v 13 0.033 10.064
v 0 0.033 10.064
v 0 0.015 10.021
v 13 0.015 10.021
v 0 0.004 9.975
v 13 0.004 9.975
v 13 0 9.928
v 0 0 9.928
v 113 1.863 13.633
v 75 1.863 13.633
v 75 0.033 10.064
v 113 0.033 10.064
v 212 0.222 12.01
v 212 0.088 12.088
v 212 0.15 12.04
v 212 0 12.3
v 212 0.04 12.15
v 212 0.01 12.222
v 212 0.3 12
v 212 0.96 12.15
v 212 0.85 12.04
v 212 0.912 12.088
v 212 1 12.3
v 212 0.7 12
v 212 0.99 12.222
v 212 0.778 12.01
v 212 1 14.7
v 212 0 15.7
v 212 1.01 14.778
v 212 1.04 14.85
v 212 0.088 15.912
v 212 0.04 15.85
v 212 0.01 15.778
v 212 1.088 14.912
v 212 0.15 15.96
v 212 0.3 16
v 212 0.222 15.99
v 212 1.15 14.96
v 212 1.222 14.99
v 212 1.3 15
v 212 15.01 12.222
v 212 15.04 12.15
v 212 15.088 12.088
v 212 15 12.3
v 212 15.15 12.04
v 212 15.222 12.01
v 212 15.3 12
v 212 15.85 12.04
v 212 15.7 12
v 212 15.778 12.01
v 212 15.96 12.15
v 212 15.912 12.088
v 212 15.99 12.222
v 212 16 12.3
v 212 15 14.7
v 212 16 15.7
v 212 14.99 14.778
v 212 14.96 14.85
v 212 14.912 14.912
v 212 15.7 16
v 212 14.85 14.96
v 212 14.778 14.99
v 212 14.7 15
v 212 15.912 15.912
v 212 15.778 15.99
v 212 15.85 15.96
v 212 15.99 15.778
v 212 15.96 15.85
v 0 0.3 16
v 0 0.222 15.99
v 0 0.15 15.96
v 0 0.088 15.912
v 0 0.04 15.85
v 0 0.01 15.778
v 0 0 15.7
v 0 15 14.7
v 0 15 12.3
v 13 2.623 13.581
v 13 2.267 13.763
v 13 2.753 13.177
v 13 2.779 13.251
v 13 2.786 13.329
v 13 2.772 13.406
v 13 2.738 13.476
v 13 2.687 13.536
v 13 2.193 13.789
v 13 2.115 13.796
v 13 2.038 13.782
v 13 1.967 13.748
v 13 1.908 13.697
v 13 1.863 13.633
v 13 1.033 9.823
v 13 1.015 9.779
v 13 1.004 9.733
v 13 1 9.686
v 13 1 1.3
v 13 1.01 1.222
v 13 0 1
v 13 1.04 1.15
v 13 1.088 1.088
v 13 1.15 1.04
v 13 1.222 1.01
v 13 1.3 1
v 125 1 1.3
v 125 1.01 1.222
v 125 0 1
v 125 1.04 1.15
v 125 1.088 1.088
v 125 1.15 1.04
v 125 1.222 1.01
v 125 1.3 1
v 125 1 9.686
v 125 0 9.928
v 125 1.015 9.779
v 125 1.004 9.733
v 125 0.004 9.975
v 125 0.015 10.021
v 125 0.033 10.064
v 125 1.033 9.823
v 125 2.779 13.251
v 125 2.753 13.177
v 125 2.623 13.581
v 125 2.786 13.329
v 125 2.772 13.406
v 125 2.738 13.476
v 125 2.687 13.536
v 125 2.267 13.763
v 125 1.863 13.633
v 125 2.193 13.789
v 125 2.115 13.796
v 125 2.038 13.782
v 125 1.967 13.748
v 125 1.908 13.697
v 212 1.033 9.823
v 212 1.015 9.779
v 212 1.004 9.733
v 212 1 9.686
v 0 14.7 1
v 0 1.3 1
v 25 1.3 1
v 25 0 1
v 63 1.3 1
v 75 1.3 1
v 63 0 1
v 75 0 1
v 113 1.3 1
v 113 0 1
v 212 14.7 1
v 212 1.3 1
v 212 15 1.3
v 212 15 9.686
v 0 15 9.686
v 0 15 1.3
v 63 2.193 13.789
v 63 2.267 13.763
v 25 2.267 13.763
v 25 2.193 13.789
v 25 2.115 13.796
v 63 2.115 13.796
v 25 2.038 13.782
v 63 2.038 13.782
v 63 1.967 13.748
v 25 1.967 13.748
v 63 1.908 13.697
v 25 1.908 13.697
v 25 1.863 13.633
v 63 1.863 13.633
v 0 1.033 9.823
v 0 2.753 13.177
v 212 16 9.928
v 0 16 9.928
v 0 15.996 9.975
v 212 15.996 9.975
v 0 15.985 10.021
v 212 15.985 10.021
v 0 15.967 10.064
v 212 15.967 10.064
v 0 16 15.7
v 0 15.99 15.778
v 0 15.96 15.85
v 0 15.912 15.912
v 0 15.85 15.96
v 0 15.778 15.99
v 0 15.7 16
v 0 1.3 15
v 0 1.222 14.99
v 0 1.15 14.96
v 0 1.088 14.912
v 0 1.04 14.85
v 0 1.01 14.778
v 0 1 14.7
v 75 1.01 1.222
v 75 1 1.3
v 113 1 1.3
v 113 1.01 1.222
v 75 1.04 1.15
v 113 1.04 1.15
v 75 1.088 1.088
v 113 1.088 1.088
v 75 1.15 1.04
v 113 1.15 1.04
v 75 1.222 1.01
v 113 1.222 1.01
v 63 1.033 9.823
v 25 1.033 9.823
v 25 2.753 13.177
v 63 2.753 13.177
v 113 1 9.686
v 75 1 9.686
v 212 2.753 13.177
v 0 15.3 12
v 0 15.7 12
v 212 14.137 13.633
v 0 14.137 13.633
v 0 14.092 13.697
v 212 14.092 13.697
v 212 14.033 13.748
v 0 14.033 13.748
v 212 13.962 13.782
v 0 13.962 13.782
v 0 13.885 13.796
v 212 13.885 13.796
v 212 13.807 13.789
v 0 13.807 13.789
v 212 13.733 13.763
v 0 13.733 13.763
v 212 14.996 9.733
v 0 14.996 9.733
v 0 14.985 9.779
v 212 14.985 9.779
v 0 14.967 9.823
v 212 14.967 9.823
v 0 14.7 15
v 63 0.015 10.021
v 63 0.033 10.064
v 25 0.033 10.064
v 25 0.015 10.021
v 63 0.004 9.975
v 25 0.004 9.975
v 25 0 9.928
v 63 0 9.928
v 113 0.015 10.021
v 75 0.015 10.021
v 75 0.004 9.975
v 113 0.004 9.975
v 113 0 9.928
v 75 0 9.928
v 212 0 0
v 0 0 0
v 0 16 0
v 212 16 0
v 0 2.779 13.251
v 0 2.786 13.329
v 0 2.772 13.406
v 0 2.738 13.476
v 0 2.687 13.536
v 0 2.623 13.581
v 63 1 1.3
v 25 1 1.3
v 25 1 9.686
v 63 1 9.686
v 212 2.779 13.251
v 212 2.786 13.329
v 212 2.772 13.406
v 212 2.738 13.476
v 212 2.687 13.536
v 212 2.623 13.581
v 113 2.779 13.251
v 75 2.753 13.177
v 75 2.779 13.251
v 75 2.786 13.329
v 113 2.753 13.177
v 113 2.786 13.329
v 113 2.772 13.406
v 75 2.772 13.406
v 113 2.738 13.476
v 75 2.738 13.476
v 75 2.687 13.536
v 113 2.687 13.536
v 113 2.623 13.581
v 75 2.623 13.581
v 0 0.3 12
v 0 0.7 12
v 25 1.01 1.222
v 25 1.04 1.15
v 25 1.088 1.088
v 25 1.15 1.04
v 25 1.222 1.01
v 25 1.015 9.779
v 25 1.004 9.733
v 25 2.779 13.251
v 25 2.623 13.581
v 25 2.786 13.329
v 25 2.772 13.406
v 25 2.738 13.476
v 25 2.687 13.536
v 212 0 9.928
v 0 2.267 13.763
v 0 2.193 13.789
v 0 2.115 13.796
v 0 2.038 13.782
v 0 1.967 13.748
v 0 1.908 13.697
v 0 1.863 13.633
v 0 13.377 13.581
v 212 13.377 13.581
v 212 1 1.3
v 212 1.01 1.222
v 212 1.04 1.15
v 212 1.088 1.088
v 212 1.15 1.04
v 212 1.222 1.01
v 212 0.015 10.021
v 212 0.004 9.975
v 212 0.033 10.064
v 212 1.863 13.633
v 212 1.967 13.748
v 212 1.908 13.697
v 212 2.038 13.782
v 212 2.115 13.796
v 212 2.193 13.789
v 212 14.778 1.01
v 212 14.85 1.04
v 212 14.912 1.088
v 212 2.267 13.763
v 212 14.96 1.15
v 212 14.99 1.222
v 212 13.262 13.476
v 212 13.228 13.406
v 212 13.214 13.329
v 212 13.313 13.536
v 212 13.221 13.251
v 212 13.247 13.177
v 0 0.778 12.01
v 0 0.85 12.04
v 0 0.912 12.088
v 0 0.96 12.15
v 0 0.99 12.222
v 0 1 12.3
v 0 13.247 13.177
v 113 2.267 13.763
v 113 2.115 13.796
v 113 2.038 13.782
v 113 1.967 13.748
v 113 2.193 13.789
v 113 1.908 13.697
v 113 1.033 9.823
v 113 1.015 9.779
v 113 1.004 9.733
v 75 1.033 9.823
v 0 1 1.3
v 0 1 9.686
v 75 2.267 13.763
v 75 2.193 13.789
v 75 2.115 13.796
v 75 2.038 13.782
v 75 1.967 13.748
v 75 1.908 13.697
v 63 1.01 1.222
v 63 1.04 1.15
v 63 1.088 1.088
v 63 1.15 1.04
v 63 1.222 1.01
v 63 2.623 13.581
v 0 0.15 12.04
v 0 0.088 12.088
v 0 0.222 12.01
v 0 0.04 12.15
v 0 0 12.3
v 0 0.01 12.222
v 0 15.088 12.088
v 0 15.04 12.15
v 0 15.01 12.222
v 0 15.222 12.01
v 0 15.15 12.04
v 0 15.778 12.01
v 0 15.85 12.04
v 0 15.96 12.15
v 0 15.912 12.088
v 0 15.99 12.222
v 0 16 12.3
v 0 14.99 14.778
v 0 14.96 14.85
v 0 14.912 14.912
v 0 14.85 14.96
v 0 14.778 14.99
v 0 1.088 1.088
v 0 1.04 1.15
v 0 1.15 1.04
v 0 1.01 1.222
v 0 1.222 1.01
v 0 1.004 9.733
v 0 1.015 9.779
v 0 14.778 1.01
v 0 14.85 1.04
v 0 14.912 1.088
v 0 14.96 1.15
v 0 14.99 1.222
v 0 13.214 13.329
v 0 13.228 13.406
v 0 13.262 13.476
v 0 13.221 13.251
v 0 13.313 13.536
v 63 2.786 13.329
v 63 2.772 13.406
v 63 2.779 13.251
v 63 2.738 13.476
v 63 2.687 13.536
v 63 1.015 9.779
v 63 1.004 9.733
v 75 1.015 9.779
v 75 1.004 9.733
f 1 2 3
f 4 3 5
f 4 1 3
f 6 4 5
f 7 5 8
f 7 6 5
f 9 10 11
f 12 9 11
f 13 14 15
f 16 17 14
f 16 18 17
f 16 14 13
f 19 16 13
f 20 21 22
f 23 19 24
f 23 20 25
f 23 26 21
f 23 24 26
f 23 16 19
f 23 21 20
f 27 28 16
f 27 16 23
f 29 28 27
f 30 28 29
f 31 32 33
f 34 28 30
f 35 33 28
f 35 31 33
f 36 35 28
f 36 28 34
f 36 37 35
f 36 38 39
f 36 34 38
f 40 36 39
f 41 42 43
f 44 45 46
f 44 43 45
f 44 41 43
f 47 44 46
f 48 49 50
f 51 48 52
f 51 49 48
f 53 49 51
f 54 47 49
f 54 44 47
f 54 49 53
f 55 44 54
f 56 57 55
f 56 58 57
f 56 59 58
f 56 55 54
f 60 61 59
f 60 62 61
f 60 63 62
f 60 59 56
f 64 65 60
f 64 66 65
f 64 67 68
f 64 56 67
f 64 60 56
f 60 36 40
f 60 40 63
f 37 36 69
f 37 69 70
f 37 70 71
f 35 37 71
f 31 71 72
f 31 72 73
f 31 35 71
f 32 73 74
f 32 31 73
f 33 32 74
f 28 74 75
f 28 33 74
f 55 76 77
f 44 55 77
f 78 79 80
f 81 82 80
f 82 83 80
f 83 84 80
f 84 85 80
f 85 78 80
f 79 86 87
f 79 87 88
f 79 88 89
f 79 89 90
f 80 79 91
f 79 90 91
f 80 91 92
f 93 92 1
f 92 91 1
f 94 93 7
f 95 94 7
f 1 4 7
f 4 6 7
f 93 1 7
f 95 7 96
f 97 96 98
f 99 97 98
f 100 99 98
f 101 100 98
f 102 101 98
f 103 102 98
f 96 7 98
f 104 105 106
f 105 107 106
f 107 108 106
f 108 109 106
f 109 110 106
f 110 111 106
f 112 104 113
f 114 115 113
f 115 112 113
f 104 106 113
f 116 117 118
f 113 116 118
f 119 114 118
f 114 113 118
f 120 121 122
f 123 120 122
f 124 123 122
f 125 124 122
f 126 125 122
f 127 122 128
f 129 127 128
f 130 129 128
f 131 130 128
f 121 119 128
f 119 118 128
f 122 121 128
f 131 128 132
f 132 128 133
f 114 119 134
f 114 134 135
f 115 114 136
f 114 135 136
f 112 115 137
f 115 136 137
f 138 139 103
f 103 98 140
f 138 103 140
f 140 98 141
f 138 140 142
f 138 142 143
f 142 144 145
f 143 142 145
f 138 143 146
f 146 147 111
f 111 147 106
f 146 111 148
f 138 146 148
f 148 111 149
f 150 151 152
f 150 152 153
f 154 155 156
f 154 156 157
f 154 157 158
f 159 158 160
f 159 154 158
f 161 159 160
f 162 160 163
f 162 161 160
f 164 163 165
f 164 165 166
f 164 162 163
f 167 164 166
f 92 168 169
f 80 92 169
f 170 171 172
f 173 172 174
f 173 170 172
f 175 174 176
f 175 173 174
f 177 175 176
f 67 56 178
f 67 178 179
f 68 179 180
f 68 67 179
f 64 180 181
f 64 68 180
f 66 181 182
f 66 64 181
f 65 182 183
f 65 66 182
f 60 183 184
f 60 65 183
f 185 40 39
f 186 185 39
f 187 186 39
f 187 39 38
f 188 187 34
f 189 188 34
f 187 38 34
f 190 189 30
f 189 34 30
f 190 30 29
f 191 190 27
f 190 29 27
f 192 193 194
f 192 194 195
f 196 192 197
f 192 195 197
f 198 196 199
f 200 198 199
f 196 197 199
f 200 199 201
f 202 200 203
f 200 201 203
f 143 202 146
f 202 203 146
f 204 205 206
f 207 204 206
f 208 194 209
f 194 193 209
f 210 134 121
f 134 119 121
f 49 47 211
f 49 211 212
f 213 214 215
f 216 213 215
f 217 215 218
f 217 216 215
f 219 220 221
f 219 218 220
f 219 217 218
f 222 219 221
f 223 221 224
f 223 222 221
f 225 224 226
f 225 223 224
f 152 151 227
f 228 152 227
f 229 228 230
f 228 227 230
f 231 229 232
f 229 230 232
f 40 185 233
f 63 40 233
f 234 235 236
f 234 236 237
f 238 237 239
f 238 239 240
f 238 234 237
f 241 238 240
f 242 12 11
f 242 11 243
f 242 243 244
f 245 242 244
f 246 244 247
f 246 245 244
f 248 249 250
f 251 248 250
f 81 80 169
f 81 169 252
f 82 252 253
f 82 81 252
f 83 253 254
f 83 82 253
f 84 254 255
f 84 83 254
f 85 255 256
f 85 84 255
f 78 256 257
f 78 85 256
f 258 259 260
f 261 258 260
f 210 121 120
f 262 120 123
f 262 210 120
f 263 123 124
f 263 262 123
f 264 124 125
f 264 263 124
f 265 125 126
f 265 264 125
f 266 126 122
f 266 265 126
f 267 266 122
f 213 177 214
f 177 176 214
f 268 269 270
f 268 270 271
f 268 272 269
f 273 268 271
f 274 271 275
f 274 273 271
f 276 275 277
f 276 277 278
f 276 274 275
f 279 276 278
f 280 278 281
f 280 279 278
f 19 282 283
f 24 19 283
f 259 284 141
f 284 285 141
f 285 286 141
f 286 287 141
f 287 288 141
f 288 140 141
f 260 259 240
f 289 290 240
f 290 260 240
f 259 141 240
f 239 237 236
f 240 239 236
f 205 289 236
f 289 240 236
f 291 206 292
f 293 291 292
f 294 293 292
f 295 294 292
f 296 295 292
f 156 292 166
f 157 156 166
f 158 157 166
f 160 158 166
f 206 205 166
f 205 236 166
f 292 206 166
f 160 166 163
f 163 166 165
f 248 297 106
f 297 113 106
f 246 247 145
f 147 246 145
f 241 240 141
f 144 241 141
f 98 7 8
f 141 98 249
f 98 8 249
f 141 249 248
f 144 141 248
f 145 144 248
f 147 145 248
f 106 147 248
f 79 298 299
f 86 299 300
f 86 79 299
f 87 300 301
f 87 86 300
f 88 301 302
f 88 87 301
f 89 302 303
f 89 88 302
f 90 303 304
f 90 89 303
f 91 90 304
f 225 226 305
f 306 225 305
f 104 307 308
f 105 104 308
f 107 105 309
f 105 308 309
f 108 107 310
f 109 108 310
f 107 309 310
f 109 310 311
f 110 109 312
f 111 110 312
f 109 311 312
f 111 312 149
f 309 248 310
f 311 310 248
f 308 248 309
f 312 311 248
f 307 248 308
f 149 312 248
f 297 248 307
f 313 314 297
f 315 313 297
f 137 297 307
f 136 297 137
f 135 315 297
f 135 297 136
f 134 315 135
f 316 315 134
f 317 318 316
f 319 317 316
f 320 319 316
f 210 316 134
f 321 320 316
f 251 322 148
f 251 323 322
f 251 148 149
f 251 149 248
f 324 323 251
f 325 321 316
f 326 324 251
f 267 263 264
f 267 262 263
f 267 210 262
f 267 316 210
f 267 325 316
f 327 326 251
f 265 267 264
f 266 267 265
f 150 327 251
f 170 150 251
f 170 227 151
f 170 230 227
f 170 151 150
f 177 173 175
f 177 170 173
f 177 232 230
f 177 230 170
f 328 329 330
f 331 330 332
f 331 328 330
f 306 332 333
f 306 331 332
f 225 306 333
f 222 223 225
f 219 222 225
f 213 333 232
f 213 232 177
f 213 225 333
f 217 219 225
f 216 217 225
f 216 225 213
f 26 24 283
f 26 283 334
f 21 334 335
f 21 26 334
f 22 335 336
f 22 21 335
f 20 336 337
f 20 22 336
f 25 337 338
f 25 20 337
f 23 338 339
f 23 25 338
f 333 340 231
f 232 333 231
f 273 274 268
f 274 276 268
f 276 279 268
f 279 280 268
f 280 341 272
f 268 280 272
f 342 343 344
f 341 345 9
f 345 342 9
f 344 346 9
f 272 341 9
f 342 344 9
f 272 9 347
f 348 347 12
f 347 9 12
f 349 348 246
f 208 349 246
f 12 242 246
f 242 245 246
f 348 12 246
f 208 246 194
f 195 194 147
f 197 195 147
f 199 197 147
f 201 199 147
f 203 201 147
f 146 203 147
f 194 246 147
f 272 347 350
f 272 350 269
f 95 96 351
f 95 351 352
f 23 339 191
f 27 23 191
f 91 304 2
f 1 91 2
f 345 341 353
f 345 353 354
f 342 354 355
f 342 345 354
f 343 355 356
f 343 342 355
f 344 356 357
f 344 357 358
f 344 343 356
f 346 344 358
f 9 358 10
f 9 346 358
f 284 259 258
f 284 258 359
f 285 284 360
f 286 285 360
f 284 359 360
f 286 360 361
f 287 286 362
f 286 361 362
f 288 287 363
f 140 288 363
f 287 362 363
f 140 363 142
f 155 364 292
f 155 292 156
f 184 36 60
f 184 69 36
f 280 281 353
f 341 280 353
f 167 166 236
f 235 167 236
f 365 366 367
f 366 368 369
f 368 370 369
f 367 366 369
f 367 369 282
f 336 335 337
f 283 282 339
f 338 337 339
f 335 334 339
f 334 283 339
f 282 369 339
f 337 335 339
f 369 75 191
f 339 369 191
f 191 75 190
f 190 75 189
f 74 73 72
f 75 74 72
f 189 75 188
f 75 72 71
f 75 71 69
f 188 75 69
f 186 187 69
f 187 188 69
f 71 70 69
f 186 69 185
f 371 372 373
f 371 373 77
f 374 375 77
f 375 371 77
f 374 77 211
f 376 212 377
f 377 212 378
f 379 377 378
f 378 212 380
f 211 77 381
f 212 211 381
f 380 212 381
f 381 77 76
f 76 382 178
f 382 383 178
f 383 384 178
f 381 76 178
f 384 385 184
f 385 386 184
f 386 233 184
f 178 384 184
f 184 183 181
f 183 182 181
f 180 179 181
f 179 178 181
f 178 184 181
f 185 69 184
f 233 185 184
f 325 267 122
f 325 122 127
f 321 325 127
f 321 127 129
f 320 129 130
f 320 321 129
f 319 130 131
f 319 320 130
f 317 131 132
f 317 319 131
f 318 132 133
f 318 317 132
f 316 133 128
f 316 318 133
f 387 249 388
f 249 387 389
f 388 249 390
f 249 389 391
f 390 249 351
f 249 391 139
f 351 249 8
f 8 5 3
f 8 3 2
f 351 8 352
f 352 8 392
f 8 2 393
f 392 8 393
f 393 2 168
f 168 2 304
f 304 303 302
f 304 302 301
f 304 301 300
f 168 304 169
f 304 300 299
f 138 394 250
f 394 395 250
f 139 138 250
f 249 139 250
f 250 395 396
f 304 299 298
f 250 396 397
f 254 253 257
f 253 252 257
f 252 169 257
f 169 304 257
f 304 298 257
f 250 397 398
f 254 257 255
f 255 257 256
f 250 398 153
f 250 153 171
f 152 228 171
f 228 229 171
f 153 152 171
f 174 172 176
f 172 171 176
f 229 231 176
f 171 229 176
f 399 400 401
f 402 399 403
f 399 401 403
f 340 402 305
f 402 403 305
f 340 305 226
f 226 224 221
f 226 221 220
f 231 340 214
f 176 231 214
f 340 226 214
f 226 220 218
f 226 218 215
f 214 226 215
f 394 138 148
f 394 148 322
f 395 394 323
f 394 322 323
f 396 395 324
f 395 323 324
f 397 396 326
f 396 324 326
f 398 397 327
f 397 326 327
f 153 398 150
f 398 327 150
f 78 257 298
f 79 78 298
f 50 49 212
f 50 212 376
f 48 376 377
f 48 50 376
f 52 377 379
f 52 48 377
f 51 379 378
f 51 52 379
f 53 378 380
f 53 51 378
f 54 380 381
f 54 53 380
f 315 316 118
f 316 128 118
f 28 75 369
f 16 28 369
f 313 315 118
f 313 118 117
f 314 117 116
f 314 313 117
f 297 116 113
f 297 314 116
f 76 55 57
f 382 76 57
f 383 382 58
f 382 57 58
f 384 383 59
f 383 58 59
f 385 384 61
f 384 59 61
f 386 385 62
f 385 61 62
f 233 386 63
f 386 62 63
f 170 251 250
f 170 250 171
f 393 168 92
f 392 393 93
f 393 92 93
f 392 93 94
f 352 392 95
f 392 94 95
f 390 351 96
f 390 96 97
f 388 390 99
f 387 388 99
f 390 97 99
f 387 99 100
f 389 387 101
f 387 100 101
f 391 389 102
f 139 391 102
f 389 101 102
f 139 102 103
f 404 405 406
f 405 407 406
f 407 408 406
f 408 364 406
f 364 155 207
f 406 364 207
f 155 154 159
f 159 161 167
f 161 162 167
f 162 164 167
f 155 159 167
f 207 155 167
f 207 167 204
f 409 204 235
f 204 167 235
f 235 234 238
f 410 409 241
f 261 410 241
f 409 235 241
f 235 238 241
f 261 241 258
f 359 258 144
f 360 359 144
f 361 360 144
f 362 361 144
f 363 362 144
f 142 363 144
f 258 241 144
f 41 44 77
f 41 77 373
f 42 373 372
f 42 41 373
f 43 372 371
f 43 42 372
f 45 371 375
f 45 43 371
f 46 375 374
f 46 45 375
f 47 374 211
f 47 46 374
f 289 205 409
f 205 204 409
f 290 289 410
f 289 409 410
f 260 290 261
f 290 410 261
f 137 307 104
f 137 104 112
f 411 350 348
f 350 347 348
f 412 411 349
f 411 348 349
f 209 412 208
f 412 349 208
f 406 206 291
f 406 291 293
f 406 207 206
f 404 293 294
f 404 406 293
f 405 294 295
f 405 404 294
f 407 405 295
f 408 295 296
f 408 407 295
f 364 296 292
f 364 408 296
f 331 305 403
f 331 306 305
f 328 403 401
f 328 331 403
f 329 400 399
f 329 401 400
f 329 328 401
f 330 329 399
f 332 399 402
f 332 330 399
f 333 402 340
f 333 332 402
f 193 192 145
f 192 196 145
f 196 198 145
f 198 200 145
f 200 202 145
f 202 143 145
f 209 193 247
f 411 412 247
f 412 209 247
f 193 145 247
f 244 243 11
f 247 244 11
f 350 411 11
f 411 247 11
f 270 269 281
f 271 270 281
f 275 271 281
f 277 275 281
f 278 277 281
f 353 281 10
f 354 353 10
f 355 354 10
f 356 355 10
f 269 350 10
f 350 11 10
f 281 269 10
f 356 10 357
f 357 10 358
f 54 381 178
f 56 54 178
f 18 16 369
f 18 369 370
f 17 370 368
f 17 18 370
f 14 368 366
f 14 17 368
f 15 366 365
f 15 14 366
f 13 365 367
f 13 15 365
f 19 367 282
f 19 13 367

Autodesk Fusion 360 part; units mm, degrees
sketch "16 mm x 16 mm conduit piping shape" plane through (0, 0, 0) normal (1, 0, 0) x (0, 1, 0)
  line L0 (0, 0) -> (16, 0)
  line L1 (16, 0) -> (16, 10)
  line L2 (16, 10) -> (14, 13.9)
  line L3 (14, 13.9) -> (13.1102, 13.4437)
  line L4 (13.1102, 13.4437) -> (15, 9.7585)
  line L5 (15, 9.7585) -> (15, 1)
  line L6 (15, 1) -> (1, 1)
  line L7 (1, 1) -> (1, 9.7585)
  line L8 (1, 9.7585) -> (2.8898, 13.4437)
  line L9 (2.8898, 13.4437) -> (2, 13.9)
  line L10 (2, 13.9) -> (0, 10)
  line L11 (0, 10) -> (0, 0)
  line L12 (0, 16) -> (16, 16)
  line L13 (0, 16) -> (0, 12)
  line L14 (0, 12) -> (1, 12)
  line L15 (1, 12) -> (1, 15)
  line L16 (1, 15) -> (15, 15)
  line L17 (15, 15) -> (15, 12)
  line L18 (15, 12) -> (16, 12)
  line L19 (16, 12) -> (16, 16)
  dimension "d1" = 1
  dimension "d2" = 16
  dimension "d3" = 1
  dimension "d4" = 1
  dimension "d7" = 10
  dimension "d8" = 10
  dimension "d9" = 16
  dimension "d10" = 1
  dimension "d11" = 1
  dimension "d12" = 1
  dimension "d13" = 4
  dimension "d14" = 4
  dimension "d15" = 16
  dimension "d16" = 2
  dimension "d17" = 2
  dimension "d18" = 1
  dimension "d19" = 1
extrude "Extrude1" add sketch "16 mm x 16 mm conduit piping shape" along normal blind 212 makes body 1 at (70.6667, 5.3333, 16) makes body 2 at (70.6667, 5.3333, 0)
fillet "Fillet1" radius 0.3 18 edges at (106, 0, 16) (106, 16, 16) (106, 16, 12) (106, 0, 12) (106, 1, 12) (106, 15, 12) (106, 1, 15) (106, 15, 15) (106, 0, 10) (106, 16, 10) (106, 14, 13.9) (106, 13.1102, 13.4437) (106, 2, 13.9) (106, 2.8898, 13.4437) (106, 15, 1) (106, 1, 1) (106, 1, 9.7585) (106, 15, 9.7585) on bodies 1 2
sketch "Sketch2" plane through (0, 0, 0) normal (0, 1, 0) x (1, 0, 0)
  line L0 (13, -1) -> (25, -1)
  line L1 (25, -1) -> (25, -13.9551)
  line L2 (25, -13.9551) -> (13, -13.9551)
  line L3 (13, -13.9551) -> (13, -1)
  line L4 (63, -1) -> (75, -1)
  line L5 (75, -1) -> (75, -13.8889)
  line L6 (75, -13.8889) -> (63, -13.8889)
  line L7 (63, -13.8889) -> (63, -1)
  line L8 (113, -1) -> (125, -1)
  line L9 (125, -1) -> (125, -13.8172)
  line L10 (125, -13.8172) -> (113, -13.8172)
  line L11 (113, -13.8172) -> (113, -1)
  line L12 (0, -9.9276) -> (0, 0)
  line L13 (0, 0) -> (212, 0)
  dimension "d24" = 12
  dimension "d25" = 12
  dimension "d26" = 12
  dimension "d27" = 13
  dimension "d28" = 38
  dimension "d29" = 38
  dimension "d30" = 1
  dimension "d31" = 1
  dimension "d32" = 1
extrude "Extrude2" cut sketch "Sketch2" along normal blind 3 bodies 2
equation "d1 = conduitThickness"
equation "d2 = conduitWidth"
equation "d3 = conduitThickness"
equation "d4 = conduitThickness"
equation "conduitThickness = 1 mm" comment "Thickness of the PVC conduit piping"
equation "conduitWidth = 16 mm" comment "Size of the outer dimensions of the conduit piping"
equation "d9 = conduitWidth"
equation "d10 = conduitThickness"
equation "d11 = conduitThickness"
equation "d12 = conduitThickness"
